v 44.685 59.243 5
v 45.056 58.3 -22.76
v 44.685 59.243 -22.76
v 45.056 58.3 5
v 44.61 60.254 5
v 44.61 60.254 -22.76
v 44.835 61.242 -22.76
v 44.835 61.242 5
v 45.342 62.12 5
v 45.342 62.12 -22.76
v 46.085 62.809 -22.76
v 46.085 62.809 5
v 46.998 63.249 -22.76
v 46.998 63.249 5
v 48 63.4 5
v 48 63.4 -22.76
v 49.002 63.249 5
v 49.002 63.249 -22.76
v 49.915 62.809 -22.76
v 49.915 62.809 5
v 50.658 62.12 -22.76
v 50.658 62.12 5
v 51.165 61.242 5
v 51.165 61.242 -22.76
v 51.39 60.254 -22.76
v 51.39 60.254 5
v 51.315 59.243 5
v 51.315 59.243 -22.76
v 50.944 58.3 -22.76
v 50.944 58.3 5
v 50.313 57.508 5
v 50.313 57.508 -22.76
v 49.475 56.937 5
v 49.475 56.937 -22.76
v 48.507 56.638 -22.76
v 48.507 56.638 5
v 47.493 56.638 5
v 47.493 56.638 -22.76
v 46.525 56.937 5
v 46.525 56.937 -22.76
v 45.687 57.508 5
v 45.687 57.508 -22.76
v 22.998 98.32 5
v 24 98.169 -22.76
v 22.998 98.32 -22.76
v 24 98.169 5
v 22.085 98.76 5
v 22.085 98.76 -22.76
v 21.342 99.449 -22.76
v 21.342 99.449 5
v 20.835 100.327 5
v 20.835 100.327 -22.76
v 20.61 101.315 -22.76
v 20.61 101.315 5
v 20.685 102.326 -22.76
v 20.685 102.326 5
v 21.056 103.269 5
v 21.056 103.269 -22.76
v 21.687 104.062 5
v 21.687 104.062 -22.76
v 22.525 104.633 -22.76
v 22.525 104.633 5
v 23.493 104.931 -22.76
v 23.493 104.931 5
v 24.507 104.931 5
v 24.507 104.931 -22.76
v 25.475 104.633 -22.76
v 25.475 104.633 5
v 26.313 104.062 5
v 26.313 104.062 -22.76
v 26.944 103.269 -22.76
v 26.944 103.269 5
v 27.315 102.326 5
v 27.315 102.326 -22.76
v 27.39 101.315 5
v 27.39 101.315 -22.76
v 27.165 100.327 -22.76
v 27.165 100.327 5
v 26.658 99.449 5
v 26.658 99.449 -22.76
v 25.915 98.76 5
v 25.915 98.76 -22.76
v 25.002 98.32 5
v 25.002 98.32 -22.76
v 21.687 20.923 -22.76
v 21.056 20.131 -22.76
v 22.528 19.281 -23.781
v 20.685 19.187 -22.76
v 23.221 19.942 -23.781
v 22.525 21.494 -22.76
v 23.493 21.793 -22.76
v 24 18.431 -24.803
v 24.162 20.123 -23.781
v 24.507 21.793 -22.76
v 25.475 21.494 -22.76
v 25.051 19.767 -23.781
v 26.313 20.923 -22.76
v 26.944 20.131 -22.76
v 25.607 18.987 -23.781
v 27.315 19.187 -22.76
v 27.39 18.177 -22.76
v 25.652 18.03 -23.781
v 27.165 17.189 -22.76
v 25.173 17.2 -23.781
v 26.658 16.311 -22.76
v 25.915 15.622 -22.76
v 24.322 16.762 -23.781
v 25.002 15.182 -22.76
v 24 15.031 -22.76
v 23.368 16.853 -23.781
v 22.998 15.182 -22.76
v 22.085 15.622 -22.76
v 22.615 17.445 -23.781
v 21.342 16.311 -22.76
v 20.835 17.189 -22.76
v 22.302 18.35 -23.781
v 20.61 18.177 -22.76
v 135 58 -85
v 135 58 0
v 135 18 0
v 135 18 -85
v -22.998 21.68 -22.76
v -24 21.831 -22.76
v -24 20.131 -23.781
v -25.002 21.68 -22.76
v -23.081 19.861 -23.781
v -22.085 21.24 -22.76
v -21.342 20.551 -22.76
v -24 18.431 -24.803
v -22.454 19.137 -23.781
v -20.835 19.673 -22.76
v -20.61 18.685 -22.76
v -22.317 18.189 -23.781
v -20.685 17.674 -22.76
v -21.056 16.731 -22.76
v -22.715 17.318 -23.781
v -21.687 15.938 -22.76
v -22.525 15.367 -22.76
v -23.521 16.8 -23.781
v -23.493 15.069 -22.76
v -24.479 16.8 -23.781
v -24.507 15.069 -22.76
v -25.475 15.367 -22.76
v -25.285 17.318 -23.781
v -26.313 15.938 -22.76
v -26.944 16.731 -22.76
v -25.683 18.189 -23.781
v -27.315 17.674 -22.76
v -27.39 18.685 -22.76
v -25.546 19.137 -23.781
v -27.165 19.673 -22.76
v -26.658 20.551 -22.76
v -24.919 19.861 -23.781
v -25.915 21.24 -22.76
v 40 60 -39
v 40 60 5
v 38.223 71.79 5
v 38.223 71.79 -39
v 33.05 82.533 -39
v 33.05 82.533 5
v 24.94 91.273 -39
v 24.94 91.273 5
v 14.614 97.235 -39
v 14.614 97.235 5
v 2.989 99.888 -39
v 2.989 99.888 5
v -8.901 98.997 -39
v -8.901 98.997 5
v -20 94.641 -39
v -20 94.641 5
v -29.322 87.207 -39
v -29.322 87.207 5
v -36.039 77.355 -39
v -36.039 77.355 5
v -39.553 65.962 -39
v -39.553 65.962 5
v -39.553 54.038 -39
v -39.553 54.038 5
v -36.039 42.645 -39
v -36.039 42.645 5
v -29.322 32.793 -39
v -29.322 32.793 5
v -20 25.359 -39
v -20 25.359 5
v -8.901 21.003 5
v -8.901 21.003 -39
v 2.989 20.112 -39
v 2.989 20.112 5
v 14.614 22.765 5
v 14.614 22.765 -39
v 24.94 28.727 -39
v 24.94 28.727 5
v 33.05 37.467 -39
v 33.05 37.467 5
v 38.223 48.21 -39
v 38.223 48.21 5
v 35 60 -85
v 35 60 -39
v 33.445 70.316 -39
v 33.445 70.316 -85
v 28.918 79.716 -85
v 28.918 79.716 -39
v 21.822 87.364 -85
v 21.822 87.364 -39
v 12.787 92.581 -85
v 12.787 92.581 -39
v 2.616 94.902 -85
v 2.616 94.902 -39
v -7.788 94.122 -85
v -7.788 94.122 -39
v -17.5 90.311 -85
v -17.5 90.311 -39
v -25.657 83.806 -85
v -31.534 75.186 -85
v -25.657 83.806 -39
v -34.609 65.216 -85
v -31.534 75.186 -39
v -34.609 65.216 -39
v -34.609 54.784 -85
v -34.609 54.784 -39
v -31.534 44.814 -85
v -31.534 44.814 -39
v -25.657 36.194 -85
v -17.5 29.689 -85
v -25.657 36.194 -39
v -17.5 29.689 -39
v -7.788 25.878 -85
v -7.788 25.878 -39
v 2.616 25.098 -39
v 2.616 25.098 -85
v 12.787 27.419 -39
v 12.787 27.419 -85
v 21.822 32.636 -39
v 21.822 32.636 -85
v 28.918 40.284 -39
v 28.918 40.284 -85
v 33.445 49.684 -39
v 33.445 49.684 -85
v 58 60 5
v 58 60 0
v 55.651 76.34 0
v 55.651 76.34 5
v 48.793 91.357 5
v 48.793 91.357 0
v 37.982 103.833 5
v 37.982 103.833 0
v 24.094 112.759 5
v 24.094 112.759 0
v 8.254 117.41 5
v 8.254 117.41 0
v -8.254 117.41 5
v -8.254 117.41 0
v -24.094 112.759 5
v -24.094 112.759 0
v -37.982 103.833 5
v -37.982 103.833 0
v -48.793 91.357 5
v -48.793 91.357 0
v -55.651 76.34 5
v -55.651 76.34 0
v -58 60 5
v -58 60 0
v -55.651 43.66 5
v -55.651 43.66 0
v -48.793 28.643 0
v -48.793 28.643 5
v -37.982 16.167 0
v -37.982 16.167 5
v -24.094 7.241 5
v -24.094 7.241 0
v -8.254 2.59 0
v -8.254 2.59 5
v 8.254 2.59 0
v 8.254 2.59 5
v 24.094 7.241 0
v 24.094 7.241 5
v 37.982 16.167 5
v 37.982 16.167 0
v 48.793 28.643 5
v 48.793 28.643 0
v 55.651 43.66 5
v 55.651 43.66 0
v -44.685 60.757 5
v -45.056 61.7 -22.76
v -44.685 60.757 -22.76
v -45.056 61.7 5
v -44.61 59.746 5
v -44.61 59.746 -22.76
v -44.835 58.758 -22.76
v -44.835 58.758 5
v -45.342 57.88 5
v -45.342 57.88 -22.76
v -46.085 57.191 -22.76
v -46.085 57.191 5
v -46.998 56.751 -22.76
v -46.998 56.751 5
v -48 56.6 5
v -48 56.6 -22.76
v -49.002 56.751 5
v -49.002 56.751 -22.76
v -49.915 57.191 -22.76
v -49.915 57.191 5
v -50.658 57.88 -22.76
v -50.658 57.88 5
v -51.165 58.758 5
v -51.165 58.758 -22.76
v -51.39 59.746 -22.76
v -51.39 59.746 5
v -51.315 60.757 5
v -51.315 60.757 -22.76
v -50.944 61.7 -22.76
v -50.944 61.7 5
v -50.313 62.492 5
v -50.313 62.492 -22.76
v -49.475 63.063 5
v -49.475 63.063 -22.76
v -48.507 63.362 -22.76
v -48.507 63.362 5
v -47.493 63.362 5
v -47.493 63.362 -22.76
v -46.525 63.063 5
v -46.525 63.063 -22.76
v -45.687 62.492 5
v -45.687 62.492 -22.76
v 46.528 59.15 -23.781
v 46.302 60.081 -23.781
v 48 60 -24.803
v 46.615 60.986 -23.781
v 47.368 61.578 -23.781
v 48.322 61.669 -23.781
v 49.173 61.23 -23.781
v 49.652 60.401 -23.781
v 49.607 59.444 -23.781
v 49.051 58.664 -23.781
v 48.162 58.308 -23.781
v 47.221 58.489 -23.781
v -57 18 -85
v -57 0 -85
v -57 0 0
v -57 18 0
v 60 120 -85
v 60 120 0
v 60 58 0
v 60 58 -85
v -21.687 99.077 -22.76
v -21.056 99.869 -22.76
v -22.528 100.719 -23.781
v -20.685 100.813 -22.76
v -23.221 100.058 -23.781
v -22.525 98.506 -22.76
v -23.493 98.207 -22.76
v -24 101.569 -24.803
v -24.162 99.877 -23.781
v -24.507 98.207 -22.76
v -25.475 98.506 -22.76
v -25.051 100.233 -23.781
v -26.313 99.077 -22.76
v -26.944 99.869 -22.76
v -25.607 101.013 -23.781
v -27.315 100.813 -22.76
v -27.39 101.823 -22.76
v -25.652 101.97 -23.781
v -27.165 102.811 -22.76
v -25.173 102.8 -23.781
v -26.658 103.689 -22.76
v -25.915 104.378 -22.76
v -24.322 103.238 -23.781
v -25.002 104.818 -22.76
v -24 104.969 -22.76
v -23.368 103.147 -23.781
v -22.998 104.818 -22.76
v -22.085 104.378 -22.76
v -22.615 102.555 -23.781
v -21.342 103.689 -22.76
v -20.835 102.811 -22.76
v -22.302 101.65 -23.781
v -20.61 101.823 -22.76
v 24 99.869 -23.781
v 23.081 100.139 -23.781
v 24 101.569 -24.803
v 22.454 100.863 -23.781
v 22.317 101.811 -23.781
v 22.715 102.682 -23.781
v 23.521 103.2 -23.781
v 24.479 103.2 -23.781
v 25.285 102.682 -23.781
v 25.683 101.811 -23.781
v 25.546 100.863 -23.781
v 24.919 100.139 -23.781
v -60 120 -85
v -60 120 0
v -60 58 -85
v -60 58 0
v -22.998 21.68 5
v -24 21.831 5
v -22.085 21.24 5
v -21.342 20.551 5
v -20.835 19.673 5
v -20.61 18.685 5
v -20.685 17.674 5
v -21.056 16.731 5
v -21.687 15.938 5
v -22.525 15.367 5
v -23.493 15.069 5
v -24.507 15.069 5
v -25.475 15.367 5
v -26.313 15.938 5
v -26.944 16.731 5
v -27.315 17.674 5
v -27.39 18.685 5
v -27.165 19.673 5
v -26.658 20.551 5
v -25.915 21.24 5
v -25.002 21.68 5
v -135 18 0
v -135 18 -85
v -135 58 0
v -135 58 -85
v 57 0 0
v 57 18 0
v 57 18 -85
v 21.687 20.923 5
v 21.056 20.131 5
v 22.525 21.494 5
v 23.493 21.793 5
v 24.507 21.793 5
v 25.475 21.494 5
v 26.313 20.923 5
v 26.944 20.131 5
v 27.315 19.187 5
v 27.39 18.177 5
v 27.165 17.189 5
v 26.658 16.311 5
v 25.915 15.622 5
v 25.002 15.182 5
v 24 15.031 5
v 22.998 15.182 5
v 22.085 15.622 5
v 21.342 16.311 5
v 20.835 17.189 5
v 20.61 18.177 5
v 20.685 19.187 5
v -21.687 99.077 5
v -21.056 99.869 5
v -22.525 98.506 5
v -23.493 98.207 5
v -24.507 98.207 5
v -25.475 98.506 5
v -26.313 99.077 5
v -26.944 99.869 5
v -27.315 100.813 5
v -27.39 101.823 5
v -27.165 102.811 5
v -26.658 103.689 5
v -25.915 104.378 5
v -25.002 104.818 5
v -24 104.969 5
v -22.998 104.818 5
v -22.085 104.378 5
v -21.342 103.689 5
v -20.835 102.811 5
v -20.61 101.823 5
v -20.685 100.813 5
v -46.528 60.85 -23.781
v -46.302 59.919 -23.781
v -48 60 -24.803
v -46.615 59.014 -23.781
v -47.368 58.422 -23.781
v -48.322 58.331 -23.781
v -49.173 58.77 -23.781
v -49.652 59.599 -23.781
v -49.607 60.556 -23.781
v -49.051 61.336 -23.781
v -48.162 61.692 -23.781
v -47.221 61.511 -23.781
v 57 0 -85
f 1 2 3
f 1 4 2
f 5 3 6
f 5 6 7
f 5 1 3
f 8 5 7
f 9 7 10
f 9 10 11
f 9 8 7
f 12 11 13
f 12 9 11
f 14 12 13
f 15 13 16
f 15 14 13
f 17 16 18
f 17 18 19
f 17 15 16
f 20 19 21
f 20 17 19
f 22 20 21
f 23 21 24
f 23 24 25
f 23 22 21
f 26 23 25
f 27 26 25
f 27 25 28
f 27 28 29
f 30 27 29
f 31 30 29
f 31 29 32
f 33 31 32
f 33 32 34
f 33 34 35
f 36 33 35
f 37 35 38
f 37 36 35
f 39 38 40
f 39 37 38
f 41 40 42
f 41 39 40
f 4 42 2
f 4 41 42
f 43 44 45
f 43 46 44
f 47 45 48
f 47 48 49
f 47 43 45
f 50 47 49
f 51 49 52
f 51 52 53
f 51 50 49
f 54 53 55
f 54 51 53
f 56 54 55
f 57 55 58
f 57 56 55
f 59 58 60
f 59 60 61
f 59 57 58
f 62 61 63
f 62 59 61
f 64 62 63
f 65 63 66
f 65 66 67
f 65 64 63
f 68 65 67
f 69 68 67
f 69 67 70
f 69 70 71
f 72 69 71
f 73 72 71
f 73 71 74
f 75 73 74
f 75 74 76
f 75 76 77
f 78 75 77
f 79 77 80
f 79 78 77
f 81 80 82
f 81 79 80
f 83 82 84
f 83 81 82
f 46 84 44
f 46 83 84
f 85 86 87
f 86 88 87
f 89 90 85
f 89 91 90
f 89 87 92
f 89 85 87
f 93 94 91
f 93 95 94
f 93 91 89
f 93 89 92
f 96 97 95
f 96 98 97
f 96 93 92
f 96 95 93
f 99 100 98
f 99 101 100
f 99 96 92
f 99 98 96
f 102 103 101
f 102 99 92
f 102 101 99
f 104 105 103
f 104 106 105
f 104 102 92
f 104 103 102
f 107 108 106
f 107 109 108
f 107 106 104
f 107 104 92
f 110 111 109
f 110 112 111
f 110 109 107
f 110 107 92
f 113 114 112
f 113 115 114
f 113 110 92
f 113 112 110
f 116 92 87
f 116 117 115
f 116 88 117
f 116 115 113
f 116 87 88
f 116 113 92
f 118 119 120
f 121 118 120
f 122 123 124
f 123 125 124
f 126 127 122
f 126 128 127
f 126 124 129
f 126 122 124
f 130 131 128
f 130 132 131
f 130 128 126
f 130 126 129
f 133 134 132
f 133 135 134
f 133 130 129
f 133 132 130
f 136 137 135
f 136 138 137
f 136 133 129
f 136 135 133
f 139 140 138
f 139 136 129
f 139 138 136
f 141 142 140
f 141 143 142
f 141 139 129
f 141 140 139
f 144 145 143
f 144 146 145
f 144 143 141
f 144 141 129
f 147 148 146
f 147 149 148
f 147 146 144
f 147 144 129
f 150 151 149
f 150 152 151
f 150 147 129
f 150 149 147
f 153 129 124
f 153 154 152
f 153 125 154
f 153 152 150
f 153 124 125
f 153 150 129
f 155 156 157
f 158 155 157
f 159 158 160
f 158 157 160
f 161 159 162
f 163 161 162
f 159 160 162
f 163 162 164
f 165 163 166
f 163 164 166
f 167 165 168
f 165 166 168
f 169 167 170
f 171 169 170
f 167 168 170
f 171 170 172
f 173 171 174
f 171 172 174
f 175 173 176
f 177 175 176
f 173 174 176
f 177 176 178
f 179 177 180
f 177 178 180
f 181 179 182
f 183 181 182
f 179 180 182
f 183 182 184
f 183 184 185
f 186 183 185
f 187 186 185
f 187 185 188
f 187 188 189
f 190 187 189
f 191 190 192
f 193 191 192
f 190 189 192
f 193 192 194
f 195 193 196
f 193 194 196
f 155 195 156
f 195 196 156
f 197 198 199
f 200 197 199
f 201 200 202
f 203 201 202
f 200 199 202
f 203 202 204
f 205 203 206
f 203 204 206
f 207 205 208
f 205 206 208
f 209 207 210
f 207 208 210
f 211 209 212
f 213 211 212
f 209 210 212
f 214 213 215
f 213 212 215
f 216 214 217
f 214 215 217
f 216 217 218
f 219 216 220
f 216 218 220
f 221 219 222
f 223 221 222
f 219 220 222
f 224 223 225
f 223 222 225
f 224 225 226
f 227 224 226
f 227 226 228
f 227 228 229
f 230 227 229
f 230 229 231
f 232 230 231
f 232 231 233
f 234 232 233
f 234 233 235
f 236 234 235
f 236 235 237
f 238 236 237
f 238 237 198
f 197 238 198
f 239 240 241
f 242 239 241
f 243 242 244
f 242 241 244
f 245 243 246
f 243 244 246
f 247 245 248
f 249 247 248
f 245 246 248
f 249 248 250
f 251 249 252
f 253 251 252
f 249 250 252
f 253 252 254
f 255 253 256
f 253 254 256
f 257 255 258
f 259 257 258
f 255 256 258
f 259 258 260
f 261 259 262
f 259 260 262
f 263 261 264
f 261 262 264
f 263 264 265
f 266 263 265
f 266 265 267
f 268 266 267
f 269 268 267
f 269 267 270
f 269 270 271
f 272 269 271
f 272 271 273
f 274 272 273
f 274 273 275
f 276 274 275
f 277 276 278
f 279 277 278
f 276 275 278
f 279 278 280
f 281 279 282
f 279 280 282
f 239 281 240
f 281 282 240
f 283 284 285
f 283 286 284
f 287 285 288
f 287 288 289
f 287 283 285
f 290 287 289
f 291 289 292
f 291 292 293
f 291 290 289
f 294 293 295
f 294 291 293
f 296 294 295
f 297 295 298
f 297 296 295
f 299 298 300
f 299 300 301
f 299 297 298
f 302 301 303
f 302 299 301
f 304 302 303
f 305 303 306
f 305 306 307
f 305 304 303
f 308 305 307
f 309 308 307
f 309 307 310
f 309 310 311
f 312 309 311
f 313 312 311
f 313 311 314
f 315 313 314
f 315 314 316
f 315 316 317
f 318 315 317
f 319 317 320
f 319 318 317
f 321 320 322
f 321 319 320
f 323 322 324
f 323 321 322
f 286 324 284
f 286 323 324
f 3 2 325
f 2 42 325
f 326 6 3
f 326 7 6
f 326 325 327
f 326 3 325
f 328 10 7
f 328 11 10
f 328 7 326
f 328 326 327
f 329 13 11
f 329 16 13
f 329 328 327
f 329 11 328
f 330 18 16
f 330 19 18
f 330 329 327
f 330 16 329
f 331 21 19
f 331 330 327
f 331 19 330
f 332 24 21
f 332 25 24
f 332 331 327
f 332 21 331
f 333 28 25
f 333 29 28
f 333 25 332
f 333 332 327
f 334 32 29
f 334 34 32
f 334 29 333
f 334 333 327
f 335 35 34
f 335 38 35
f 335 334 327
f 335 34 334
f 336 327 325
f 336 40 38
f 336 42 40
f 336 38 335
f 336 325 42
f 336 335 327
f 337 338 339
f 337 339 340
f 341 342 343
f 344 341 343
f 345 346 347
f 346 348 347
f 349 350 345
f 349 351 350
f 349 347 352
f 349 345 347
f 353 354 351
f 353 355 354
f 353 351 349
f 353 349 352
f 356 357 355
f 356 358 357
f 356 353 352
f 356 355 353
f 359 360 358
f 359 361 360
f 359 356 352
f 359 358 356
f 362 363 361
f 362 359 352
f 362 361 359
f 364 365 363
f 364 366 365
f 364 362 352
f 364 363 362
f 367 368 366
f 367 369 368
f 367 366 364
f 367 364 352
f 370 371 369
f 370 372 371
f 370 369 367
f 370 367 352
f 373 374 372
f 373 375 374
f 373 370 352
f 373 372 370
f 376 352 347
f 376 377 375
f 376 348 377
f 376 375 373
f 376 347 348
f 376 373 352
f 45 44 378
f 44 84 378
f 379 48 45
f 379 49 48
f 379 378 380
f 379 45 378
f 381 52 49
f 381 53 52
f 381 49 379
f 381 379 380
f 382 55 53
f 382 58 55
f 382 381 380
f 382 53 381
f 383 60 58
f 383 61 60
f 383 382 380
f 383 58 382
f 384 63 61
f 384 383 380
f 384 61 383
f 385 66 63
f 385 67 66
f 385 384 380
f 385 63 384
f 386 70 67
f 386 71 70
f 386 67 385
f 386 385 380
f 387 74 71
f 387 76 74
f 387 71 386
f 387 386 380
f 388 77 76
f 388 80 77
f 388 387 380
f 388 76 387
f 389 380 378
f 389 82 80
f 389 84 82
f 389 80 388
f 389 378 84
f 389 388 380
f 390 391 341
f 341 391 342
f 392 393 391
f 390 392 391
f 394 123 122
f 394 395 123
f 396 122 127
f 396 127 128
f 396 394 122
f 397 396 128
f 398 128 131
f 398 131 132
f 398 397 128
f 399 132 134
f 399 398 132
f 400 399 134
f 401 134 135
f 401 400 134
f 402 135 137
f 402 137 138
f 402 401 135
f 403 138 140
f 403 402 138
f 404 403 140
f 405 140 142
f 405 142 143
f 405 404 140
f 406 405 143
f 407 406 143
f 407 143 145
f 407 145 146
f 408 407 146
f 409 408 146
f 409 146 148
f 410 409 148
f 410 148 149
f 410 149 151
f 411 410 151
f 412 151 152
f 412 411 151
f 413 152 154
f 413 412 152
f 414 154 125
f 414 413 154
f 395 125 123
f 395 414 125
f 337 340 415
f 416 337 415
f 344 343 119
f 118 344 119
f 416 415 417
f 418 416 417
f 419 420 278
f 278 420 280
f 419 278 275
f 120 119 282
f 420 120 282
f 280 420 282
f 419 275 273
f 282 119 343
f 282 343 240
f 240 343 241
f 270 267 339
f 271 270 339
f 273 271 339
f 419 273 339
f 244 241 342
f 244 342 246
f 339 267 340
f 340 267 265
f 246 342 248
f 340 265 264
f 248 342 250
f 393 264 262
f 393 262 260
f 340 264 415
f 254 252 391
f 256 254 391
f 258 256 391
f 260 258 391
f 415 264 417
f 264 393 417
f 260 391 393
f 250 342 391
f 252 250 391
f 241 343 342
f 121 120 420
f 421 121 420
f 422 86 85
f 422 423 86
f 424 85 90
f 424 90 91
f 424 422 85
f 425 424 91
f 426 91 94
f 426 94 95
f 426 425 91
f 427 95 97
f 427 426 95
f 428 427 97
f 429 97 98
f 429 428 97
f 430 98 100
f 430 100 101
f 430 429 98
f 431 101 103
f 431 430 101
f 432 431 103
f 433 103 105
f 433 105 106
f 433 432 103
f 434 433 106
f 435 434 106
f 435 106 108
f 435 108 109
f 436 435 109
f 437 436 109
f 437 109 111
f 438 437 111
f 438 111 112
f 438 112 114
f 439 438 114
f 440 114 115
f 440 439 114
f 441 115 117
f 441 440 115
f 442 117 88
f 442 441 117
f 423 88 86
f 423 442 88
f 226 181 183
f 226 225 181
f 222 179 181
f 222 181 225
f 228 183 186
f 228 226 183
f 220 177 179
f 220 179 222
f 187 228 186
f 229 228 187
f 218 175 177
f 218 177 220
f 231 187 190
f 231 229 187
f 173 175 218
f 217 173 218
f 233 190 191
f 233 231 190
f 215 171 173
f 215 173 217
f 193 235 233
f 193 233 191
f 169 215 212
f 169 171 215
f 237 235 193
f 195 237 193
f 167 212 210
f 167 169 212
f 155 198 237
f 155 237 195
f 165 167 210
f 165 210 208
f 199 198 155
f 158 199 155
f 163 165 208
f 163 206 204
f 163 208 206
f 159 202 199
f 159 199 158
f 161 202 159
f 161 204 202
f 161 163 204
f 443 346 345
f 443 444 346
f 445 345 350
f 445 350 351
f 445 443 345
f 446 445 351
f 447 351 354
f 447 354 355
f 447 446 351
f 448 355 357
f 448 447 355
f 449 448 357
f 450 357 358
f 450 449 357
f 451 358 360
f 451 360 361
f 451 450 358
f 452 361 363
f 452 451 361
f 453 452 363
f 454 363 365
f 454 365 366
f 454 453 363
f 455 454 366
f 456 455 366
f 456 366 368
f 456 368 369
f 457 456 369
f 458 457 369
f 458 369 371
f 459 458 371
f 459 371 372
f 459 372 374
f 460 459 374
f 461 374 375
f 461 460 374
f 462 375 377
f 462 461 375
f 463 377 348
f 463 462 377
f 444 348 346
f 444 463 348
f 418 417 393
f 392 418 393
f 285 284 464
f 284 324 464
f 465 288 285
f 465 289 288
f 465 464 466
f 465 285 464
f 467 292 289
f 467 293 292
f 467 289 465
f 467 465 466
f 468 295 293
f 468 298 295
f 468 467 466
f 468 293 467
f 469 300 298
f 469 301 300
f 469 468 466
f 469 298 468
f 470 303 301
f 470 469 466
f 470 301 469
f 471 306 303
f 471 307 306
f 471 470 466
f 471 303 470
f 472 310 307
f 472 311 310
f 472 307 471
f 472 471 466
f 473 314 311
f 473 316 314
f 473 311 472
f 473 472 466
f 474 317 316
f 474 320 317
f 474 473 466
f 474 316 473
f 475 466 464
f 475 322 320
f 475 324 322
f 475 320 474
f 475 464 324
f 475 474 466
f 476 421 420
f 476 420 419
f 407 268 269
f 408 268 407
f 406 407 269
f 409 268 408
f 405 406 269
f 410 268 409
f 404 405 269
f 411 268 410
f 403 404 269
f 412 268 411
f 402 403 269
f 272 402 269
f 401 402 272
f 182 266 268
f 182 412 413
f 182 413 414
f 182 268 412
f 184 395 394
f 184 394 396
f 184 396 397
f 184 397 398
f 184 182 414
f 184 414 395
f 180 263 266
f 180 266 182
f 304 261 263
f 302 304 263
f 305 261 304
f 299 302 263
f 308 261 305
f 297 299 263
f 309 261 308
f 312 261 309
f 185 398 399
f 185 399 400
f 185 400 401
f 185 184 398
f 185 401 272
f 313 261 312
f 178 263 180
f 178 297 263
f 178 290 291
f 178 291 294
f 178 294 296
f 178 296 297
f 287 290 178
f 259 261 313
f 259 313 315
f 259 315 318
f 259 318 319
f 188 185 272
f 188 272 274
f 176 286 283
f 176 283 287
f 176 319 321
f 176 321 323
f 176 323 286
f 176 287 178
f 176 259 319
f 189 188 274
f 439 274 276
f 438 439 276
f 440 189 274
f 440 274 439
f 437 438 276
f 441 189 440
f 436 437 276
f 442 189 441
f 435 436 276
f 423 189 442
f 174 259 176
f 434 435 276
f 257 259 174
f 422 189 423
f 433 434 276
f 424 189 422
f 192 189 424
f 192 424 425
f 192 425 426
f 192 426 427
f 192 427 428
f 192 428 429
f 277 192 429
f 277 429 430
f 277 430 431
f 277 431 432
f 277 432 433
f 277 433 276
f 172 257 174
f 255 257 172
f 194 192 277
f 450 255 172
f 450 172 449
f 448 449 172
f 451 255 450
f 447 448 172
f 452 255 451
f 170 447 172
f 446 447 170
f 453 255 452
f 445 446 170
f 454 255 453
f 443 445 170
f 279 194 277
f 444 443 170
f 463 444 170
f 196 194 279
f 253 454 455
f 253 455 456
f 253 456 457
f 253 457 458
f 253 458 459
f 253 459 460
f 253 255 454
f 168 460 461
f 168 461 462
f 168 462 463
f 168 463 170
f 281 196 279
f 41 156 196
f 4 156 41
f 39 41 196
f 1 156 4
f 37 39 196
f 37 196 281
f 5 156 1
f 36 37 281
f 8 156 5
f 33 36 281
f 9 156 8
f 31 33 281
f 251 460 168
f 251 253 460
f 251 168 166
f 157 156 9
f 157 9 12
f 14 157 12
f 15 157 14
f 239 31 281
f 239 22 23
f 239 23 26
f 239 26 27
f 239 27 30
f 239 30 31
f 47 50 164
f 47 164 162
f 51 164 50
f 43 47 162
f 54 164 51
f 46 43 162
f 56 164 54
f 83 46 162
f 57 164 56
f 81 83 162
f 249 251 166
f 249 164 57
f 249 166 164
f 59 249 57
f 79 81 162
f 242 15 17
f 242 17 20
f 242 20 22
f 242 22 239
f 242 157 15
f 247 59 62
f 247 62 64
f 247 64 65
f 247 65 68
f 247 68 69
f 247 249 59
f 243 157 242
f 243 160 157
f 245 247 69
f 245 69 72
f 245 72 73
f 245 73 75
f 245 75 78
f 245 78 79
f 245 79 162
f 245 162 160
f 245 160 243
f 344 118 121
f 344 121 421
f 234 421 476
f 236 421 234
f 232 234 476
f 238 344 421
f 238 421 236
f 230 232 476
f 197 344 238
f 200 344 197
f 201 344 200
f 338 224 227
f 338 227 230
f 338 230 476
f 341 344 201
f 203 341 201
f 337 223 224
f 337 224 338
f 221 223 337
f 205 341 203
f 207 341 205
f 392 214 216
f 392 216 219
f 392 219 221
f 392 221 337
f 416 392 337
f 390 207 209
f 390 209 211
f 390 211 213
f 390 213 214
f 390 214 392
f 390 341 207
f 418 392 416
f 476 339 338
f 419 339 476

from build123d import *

# Parameters (mm, degrees)
EXTRUDE_1_DEPTH          = 85
SKETCH_2_R               = 58
EXTRUDE_2_DEPTH          = 5
SKETCH_3_R               = 40
CUT_EXTRUDE_1_DEPTH      = 44
SKETCH_4_R               = 35
CUT_EXTRUDE_2_DEPTH      = 187.38937738
PATTERN_CIRCULAR_1_COUNT = 6


with BuildPart() as part:
    # 草图1 → 凸台-拉伸1 (new body)
    with BuildSketch(Plane.XY):
        Polygon((0, 0), (-57, 0), (-57, 18), (-135, 18), (-135, 58), (-60, 58), (-60, 120), (60, 120), (60, 58), (135, 58), (135, 18), (57, 18), (57, 0), align=None)
    extrude(amount=-EXTRUDE_1_DEPTH)

    # 草图2 → 凸台-拉伸2 (add)
    with BuildSketch(Plane.XY):
        with Locations((0, 60)):
            Circle(SKETCH_2_R)
    extrude(amount=EXTRUDE_2_DEPTH)

    # 草图3 → 切除-拉伸1 (cut)
    with BuildSketch(Plane.XY.offset(5)):
        with Locations((0, 60)):
            Circle(SKETCH_3_R)
    extrude(amount=-CUT_EXTRUDE_1_DEPTH, mode=Mode.SUBTRACT)

    # 草图4 → 切除-拉伸2 (cut, through all)
    with BuildSketch(Plane.XY.offset(-39)):
        with Locations((0, 60)):
            Circle(SKETCH_4_R)
    extrude(amount=-CUT_EXTRUDE_2_DEPTH, mode=Mode.SUBTRACT)

    # 草图7 → M8 螺纹孔1 (revolve, cut)
    with BuildSketch(Plane(origin=(24, 101.569219382, 5), x_dir=(0, -1, 0), z_dir=(1, 0, 0))):
        Polygon((0, 0), (0, 29.802926105), (3.4, 27.76), (3.4, 0), align=None)
    hole_wizard_m8_1 = revolve(axis=Axis((24, 101.569219382, 11.35), (0, 0, -1)), mode=Mode.SUBTRACT)

    # 阵列(圆周)1: M8 螺纹孔1 ×6 about axis
    pattern_circular_1_axis = Axis((0, 60, 0), (0, 0, 1))
    for i in range(1, PATTERN_CIRCULAR_1_COUNT):
        add(hole_wizard_m8_1.rotate(pattern_circular_1_axis, i * 360 / PATTERN_CIRCULAR_1_COUNT), mode=Mode.SUBTRACT)


solid = part.part
